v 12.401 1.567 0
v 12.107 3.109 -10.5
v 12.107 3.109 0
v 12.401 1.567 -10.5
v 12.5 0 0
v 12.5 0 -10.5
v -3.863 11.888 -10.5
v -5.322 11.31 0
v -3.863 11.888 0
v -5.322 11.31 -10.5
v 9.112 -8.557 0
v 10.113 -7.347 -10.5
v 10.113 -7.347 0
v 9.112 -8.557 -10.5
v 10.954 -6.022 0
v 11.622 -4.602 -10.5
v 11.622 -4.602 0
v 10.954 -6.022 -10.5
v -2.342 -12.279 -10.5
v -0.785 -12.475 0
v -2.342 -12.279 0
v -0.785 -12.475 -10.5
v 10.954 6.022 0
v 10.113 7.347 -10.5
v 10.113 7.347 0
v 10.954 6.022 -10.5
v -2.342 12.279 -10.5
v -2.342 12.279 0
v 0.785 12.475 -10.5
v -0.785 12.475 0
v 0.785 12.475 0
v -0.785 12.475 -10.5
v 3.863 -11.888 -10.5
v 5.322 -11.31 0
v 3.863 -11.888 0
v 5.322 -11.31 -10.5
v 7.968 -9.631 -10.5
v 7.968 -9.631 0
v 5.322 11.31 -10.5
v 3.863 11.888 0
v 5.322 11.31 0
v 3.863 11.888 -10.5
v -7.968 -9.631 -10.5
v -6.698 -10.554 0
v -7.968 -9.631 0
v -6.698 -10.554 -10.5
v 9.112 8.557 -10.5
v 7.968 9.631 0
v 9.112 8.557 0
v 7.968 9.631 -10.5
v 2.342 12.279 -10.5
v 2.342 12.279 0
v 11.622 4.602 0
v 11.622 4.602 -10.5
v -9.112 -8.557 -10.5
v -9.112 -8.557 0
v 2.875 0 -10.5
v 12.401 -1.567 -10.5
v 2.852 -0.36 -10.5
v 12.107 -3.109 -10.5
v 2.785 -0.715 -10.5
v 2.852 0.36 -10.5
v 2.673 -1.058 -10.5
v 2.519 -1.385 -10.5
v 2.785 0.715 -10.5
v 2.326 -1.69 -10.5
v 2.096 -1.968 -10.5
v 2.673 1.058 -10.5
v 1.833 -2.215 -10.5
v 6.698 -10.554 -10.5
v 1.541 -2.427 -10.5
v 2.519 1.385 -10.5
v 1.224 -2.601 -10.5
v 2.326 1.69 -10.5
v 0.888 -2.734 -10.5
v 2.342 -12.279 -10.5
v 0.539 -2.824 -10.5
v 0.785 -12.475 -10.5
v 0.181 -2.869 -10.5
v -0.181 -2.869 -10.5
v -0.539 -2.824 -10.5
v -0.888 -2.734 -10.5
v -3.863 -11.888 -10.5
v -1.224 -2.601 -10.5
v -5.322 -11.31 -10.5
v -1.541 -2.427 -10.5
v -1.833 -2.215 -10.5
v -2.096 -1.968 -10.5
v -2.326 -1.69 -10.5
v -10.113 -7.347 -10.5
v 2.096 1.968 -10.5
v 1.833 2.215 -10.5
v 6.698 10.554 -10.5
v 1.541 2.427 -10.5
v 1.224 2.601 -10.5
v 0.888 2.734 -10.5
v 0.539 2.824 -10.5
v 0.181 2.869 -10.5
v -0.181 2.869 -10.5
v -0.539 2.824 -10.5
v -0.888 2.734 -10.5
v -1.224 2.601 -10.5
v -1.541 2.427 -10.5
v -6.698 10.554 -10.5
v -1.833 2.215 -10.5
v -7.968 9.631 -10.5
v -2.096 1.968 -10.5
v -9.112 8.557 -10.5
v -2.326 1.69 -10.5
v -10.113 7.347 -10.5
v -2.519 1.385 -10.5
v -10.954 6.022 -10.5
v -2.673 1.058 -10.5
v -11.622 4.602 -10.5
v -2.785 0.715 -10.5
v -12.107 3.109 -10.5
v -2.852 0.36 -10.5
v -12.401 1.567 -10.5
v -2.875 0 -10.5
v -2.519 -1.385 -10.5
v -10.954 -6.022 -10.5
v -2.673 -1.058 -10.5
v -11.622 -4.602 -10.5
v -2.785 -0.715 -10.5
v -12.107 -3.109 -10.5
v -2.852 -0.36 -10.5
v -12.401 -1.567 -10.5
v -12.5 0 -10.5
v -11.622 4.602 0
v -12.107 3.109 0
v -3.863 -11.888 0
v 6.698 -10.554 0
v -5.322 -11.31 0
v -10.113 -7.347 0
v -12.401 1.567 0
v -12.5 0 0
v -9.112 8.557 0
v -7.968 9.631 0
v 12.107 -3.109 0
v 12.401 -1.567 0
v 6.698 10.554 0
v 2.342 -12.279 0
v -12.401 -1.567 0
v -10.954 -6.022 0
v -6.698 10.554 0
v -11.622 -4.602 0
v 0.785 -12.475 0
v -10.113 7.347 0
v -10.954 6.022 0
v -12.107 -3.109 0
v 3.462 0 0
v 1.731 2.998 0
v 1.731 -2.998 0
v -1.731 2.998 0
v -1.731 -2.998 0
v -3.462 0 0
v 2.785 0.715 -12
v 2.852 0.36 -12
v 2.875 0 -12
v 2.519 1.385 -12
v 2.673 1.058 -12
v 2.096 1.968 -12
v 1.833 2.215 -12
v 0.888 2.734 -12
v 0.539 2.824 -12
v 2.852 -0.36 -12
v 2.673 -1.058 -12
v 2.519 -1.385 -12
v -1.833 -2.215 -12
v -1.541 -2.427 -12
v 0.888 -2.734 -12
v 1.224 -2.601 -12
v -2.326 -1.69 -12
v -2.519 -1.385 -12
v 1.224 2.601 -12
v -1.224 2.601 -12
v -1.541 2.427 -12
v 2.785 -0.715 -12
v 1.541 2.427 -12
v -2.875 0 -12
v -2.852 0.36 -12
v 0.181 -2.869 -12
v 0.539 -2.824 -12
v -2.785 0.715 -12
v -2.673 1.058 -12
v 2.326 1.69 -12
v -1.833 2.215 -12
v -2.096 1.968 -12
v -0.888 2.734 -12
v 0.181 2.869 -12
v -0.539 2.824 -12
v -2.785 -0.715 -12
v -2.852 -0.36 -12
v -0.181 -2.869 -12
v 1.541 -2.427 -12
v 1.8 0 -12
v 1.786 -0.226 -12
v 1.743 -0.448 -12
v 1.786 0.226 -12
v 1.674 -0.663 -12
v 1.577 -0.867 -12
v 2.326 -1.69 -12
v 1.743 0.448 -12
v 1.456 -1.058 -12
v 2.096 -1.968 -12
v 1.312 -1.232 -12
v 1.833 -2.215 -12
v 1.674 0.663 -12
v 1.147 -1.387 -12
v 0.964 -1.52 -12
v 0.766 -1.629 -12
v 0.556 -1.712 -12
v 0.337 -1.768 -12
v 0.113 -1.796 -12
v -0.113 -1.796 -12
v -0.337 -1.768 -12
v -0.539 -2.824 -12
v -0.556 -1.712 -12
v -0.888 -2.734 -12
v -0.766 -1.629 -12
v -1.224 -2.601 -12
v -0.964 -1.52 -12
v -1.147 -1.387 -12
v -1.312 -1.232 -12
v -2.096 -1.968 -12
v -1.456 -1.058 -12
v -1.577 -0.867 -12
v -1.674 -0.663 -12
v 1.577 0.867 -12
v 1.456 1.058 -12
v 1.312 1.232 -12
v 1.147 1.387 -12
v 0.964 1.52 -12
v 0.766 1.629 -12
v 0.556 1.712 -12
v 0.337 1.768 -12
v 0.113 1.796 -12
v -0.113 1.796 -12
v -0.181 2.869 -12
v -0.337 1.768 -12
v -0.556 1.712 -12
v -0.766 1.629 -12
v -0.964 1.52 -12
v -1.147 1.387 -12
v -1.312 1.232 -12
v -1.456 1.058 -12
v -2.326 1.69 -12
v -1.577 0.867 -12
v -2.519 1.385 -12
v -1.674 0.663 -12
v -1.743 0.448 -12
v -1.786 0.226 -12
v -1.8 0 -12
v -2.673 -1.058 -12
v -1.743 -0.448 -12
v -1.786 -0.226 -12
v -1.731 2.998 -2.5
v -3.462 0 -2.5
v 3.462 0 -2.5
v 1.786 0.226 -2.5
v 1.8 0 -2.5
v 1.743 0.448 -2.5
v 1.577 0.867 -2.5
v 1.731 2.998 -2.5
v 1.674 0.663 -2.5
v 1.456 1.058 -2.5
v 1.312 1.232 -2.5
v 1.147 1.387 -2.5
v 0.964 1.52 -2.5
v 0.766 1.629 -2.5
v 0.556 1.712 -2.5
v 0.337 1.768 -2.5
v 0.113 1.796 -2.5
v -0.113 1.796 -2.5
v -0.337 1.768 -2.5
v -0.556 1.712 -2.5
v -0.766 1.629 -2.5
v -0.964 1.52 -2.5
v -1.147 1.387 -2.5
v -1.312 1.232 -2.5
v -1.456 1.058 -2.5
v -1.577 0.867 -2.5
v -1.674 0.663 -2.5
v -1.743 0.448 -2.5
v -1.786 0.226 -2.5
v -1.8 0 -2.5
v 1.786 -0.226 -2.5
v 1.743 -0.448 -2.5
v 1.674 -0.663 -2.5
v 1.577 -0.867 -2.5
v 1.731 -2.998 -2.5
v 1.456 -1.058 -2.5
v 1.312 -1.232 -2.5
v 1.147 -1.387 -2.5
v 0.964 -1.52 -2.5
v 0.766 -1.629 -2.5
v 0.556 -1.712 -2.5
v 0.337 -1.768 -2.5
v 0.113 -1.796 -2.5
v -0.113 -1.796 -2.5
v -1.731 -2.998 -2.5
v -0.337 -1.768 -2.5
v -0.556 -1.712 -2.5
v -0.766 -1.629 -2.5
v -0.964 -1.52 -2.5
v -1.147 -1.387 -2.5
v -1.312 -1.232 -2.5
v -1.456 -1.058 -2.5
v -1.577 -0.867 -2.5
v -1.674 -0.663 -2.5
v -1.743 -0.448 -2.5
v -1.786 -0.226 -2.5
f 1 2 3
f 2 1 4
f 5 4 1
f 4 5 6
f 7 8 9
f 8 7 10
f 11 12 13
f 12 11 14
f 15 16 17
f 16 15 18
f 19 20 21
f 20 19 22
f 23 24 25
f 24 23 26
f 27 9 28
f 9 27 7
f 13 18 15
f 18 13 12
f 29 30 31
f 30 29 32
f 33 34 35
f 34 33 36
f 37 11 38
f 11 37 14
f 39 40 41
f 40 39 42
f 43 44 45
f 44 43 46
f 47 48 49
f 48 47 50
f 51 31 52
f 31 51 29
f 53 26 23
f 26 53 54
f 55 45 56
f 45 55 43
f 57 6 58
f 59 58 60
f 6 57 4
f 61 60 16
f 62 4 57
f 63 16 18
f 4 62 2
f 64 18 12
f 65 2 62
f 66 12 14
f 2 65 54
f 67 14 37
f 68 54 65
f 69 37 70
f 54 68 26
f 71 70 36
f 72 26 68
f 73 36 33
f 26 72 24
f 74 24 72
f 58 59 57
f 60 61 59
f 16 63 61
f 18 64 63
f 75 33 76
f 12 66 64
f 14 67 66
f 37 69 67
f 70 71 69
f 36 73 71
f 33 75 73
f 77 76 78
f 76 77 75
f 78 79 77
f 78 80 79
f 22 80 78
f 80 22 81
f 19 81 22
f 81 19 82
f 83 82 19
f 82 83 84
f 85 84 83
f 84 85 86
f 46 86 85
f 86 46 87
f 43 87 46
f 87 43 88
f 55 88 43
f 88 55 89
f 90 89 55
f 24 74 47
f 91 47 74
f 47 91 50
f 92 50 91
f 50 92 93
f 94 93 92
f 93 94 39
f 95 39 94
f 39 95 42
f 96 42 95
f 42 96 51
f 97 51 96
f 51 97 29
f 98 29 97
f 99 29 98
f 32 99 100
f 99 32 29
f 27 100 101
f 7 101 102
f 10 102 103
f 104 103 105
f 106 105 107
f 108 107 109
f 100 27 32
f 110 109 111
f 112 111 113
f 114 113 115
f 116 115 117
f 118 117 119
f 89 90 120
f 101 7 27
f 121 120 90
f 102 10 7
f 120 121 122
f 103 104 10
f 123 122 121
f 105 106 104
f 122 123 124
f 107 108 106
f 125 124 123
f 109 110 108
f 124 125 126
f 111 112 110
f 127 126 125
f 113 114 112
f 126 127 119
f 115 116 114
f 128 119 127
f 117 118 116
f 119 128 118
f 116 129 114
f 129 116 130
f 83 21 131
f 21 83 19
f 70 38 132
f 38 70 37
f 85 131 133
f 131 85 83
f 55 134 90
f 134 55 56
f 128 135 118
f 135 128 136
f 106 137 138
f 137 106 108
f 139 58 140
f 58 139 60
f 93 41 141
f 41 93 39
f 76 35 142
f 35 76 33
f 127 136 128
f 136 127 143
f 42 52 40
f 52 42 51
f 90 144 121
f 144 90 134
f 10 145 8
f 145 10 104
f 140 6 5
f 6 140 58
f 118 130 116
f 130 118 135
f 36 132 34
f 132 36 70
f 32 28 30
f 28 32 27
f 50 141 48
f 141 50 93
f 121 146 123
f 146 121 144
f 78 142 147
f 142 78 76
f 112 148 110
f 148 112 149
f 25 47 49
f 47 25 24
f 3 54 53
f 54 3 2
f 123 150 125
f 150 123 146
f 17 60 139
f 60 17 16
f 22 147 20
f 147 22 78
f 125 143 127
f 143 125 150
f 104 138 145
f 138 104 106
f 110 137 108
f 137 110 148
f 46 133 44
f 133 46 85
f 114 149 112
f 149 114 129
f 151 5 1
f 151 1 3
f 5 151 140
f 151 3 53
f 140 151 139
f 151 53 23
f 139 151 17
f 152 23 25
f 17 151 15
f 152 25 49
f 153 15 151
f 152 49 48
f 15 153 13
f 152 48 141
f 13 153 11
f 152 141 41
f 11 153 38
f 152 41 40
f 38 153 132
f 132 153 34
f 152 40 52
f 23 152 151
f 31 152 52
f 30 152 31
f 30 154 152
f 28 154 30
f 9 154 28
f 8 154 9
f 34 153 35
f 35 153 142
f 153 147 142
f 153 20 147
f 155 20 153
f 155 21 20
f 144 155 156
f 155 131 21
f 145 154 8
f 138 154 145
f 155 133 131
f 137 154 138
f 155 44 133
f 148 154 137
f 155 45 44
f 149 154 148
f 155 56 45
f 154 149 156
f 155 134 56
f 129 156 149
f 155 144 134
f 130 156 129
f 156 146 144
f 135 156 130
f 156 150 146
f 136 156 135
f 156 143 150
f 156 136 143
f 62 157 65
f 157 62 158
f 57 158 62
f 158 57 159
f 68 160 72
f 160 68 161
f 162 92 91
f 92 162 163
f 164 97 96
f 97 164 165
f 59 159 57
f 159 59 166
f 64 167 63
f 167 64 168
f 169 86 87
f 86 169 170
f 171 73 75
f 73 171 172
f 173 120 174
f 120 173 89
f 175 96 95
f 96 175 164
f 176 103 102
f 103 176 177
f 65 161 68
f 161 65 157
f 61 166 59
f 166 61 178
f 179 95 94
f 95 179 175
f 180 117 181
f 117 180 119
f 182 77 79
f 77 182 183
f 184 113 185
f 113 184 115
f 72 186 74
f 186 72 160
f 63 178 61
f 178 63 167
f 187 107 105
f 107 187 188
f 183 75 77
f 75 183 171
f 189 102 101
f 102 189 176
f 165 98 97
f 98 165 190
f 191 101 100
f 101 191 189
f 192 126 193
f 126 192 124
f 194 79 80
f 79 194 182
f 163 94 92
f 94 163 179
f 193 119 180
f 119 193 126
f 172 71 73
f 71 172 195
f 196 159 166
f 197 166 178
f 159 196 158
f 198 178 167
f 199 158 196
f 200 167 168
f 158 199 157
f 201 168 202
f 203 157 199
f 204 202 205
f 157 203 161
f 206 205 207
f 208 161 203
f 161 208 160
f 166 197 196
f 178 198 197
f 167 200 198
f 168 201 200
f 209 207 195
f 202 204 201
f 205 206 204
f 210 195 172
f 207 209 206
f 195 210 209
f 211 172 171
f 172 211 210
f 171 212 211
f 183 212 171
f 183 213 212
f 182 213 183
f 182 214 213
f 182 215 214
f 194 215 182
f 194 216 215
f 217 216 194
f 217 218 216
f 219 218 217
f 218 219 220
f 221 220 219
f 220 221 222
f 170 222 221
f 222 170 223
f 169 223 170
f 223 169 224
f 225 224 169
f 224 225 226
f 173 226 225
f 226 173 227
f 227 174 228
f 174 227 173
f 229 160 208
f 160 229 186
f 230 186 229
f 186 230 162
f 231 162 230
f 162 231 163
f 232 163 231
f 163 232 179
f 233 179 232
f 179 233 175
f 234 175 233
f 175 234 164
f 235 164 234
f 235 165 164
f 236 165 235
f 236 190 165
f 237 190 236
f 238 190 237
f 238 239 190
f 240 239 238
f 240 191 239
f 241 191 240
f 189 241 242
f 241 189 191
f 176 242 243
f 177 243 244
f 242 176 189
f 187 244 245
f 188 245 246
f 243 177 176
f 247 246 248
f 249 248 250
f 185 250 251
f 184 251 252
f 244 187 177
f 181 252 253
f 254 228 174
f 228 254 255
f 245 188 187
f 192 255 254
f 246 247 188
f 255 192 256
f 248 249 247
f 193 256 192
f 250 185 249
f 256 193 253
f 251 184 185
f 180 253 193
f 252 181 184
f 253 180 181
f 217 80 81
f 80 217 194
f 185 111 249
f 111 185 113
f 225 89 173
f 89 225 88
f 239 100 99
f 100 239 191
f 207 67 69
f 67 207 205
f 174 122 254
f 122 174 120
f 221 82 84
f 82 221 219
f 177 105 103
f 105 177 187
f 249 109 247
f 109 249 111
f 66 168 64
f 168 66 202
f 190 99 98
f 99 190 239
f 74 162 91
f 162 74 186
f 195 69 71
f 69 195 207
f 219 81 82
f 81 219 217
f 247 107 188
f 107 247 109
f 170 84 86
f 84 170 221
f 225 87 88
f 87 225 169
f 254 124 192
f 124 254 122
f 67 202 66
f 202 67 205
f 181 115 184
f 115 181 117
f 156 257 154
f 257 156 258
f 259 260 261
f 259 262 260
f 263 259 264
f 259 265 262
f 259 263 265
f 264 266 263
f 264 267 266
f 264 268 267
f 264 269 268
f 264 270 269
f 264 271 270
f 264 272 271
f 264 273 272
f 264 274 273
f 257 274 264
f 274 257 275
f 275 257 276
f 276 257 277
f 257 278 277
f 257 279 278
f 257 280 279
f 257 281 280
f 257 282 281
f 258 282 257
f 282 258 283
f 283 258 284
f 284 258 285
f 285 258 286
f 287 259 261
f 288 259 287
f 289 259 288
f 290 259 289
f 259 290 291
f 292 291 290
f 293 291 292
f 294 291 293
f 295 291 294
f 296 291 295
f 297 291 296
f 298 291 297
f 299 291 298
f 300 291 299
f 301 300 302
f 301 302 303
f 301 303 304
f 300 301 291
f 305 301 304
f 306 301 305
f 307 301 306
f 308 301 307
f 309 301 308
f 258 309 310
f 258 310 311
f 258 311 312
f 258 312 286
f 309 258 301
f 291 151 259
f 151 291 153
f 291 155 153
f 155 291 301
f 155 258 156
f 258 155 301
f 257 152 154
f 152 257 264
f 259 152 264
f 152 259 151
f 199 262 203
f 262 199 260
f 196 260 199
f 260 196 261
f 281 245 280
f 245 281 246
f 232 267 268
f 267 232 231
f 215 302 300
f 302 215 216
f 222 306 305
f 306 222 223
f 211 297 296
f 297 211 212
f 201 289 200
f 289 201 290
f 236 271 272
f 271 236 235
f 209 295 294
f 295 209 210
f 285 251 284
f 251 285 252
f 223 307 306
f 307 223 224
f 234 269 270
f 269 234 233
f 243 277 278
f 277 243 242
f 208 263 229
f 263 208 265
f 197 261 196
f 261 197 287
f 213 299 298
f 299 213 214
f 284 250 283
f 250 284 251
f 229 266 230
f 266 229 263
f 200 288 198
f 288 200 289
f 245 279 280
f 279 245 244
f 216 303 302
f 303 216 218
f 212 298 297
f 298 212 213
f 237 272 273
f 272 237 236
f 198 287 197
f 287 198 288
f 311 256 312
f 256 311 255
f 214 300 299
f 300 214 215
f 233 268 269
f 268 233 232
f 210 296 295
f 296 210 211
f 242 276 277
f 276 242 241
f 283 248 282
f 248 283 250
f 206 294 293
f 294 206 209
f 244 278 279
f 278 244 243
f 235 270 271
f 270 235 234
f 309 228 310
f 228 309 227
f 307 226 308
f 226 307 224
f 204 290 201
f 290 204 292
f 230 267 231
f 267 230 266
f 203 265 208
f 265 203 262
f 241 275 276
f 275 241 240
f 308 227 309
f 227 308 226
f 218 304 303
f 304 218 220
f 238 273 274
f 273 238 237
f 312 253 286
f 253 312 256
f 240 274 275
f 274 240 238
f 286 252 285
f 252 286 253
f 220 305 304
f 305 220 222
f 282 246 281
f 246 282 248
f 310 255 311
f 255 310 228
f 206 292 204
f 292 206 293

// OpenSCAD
$fn = 50;


difference() {
	union() {
		translate(v = [0, 0, -10.5000000000]) {
			cylinder(h = 10.5000000000, r = 12.5000000000);
		}
		#translate(v = [0, 0, -12.0000000000]) {
			cylinder(h = 12, r = 2.8750000000);
		}
	}
	union() {
		translate(v = [0, 0, 0]) {
			rotate(a = [0, 0, 0]) {
				difference() {
					union() {
						translate(v = [0, 0, -2.5000000000]) {
							linear_extrude(height = 2.5000000000) {
								polygon(points = [[3.4620000000, 0.0000000000], [1.7310000000, 2.9981799479], [-1.7310000000, 2.9981799479], [-3.4620000000, 0.0000000000], [-1.7310000000, -2.9981799479], [1.7310000000, -2.9981799479]]);
							}
						}
					}
					union();
				}
			}
		}
		#translate(v = [0, 0, -100.0000000000]) {
			cylinder(h = 200, r = 1.8000000000);
		}
	}
}
